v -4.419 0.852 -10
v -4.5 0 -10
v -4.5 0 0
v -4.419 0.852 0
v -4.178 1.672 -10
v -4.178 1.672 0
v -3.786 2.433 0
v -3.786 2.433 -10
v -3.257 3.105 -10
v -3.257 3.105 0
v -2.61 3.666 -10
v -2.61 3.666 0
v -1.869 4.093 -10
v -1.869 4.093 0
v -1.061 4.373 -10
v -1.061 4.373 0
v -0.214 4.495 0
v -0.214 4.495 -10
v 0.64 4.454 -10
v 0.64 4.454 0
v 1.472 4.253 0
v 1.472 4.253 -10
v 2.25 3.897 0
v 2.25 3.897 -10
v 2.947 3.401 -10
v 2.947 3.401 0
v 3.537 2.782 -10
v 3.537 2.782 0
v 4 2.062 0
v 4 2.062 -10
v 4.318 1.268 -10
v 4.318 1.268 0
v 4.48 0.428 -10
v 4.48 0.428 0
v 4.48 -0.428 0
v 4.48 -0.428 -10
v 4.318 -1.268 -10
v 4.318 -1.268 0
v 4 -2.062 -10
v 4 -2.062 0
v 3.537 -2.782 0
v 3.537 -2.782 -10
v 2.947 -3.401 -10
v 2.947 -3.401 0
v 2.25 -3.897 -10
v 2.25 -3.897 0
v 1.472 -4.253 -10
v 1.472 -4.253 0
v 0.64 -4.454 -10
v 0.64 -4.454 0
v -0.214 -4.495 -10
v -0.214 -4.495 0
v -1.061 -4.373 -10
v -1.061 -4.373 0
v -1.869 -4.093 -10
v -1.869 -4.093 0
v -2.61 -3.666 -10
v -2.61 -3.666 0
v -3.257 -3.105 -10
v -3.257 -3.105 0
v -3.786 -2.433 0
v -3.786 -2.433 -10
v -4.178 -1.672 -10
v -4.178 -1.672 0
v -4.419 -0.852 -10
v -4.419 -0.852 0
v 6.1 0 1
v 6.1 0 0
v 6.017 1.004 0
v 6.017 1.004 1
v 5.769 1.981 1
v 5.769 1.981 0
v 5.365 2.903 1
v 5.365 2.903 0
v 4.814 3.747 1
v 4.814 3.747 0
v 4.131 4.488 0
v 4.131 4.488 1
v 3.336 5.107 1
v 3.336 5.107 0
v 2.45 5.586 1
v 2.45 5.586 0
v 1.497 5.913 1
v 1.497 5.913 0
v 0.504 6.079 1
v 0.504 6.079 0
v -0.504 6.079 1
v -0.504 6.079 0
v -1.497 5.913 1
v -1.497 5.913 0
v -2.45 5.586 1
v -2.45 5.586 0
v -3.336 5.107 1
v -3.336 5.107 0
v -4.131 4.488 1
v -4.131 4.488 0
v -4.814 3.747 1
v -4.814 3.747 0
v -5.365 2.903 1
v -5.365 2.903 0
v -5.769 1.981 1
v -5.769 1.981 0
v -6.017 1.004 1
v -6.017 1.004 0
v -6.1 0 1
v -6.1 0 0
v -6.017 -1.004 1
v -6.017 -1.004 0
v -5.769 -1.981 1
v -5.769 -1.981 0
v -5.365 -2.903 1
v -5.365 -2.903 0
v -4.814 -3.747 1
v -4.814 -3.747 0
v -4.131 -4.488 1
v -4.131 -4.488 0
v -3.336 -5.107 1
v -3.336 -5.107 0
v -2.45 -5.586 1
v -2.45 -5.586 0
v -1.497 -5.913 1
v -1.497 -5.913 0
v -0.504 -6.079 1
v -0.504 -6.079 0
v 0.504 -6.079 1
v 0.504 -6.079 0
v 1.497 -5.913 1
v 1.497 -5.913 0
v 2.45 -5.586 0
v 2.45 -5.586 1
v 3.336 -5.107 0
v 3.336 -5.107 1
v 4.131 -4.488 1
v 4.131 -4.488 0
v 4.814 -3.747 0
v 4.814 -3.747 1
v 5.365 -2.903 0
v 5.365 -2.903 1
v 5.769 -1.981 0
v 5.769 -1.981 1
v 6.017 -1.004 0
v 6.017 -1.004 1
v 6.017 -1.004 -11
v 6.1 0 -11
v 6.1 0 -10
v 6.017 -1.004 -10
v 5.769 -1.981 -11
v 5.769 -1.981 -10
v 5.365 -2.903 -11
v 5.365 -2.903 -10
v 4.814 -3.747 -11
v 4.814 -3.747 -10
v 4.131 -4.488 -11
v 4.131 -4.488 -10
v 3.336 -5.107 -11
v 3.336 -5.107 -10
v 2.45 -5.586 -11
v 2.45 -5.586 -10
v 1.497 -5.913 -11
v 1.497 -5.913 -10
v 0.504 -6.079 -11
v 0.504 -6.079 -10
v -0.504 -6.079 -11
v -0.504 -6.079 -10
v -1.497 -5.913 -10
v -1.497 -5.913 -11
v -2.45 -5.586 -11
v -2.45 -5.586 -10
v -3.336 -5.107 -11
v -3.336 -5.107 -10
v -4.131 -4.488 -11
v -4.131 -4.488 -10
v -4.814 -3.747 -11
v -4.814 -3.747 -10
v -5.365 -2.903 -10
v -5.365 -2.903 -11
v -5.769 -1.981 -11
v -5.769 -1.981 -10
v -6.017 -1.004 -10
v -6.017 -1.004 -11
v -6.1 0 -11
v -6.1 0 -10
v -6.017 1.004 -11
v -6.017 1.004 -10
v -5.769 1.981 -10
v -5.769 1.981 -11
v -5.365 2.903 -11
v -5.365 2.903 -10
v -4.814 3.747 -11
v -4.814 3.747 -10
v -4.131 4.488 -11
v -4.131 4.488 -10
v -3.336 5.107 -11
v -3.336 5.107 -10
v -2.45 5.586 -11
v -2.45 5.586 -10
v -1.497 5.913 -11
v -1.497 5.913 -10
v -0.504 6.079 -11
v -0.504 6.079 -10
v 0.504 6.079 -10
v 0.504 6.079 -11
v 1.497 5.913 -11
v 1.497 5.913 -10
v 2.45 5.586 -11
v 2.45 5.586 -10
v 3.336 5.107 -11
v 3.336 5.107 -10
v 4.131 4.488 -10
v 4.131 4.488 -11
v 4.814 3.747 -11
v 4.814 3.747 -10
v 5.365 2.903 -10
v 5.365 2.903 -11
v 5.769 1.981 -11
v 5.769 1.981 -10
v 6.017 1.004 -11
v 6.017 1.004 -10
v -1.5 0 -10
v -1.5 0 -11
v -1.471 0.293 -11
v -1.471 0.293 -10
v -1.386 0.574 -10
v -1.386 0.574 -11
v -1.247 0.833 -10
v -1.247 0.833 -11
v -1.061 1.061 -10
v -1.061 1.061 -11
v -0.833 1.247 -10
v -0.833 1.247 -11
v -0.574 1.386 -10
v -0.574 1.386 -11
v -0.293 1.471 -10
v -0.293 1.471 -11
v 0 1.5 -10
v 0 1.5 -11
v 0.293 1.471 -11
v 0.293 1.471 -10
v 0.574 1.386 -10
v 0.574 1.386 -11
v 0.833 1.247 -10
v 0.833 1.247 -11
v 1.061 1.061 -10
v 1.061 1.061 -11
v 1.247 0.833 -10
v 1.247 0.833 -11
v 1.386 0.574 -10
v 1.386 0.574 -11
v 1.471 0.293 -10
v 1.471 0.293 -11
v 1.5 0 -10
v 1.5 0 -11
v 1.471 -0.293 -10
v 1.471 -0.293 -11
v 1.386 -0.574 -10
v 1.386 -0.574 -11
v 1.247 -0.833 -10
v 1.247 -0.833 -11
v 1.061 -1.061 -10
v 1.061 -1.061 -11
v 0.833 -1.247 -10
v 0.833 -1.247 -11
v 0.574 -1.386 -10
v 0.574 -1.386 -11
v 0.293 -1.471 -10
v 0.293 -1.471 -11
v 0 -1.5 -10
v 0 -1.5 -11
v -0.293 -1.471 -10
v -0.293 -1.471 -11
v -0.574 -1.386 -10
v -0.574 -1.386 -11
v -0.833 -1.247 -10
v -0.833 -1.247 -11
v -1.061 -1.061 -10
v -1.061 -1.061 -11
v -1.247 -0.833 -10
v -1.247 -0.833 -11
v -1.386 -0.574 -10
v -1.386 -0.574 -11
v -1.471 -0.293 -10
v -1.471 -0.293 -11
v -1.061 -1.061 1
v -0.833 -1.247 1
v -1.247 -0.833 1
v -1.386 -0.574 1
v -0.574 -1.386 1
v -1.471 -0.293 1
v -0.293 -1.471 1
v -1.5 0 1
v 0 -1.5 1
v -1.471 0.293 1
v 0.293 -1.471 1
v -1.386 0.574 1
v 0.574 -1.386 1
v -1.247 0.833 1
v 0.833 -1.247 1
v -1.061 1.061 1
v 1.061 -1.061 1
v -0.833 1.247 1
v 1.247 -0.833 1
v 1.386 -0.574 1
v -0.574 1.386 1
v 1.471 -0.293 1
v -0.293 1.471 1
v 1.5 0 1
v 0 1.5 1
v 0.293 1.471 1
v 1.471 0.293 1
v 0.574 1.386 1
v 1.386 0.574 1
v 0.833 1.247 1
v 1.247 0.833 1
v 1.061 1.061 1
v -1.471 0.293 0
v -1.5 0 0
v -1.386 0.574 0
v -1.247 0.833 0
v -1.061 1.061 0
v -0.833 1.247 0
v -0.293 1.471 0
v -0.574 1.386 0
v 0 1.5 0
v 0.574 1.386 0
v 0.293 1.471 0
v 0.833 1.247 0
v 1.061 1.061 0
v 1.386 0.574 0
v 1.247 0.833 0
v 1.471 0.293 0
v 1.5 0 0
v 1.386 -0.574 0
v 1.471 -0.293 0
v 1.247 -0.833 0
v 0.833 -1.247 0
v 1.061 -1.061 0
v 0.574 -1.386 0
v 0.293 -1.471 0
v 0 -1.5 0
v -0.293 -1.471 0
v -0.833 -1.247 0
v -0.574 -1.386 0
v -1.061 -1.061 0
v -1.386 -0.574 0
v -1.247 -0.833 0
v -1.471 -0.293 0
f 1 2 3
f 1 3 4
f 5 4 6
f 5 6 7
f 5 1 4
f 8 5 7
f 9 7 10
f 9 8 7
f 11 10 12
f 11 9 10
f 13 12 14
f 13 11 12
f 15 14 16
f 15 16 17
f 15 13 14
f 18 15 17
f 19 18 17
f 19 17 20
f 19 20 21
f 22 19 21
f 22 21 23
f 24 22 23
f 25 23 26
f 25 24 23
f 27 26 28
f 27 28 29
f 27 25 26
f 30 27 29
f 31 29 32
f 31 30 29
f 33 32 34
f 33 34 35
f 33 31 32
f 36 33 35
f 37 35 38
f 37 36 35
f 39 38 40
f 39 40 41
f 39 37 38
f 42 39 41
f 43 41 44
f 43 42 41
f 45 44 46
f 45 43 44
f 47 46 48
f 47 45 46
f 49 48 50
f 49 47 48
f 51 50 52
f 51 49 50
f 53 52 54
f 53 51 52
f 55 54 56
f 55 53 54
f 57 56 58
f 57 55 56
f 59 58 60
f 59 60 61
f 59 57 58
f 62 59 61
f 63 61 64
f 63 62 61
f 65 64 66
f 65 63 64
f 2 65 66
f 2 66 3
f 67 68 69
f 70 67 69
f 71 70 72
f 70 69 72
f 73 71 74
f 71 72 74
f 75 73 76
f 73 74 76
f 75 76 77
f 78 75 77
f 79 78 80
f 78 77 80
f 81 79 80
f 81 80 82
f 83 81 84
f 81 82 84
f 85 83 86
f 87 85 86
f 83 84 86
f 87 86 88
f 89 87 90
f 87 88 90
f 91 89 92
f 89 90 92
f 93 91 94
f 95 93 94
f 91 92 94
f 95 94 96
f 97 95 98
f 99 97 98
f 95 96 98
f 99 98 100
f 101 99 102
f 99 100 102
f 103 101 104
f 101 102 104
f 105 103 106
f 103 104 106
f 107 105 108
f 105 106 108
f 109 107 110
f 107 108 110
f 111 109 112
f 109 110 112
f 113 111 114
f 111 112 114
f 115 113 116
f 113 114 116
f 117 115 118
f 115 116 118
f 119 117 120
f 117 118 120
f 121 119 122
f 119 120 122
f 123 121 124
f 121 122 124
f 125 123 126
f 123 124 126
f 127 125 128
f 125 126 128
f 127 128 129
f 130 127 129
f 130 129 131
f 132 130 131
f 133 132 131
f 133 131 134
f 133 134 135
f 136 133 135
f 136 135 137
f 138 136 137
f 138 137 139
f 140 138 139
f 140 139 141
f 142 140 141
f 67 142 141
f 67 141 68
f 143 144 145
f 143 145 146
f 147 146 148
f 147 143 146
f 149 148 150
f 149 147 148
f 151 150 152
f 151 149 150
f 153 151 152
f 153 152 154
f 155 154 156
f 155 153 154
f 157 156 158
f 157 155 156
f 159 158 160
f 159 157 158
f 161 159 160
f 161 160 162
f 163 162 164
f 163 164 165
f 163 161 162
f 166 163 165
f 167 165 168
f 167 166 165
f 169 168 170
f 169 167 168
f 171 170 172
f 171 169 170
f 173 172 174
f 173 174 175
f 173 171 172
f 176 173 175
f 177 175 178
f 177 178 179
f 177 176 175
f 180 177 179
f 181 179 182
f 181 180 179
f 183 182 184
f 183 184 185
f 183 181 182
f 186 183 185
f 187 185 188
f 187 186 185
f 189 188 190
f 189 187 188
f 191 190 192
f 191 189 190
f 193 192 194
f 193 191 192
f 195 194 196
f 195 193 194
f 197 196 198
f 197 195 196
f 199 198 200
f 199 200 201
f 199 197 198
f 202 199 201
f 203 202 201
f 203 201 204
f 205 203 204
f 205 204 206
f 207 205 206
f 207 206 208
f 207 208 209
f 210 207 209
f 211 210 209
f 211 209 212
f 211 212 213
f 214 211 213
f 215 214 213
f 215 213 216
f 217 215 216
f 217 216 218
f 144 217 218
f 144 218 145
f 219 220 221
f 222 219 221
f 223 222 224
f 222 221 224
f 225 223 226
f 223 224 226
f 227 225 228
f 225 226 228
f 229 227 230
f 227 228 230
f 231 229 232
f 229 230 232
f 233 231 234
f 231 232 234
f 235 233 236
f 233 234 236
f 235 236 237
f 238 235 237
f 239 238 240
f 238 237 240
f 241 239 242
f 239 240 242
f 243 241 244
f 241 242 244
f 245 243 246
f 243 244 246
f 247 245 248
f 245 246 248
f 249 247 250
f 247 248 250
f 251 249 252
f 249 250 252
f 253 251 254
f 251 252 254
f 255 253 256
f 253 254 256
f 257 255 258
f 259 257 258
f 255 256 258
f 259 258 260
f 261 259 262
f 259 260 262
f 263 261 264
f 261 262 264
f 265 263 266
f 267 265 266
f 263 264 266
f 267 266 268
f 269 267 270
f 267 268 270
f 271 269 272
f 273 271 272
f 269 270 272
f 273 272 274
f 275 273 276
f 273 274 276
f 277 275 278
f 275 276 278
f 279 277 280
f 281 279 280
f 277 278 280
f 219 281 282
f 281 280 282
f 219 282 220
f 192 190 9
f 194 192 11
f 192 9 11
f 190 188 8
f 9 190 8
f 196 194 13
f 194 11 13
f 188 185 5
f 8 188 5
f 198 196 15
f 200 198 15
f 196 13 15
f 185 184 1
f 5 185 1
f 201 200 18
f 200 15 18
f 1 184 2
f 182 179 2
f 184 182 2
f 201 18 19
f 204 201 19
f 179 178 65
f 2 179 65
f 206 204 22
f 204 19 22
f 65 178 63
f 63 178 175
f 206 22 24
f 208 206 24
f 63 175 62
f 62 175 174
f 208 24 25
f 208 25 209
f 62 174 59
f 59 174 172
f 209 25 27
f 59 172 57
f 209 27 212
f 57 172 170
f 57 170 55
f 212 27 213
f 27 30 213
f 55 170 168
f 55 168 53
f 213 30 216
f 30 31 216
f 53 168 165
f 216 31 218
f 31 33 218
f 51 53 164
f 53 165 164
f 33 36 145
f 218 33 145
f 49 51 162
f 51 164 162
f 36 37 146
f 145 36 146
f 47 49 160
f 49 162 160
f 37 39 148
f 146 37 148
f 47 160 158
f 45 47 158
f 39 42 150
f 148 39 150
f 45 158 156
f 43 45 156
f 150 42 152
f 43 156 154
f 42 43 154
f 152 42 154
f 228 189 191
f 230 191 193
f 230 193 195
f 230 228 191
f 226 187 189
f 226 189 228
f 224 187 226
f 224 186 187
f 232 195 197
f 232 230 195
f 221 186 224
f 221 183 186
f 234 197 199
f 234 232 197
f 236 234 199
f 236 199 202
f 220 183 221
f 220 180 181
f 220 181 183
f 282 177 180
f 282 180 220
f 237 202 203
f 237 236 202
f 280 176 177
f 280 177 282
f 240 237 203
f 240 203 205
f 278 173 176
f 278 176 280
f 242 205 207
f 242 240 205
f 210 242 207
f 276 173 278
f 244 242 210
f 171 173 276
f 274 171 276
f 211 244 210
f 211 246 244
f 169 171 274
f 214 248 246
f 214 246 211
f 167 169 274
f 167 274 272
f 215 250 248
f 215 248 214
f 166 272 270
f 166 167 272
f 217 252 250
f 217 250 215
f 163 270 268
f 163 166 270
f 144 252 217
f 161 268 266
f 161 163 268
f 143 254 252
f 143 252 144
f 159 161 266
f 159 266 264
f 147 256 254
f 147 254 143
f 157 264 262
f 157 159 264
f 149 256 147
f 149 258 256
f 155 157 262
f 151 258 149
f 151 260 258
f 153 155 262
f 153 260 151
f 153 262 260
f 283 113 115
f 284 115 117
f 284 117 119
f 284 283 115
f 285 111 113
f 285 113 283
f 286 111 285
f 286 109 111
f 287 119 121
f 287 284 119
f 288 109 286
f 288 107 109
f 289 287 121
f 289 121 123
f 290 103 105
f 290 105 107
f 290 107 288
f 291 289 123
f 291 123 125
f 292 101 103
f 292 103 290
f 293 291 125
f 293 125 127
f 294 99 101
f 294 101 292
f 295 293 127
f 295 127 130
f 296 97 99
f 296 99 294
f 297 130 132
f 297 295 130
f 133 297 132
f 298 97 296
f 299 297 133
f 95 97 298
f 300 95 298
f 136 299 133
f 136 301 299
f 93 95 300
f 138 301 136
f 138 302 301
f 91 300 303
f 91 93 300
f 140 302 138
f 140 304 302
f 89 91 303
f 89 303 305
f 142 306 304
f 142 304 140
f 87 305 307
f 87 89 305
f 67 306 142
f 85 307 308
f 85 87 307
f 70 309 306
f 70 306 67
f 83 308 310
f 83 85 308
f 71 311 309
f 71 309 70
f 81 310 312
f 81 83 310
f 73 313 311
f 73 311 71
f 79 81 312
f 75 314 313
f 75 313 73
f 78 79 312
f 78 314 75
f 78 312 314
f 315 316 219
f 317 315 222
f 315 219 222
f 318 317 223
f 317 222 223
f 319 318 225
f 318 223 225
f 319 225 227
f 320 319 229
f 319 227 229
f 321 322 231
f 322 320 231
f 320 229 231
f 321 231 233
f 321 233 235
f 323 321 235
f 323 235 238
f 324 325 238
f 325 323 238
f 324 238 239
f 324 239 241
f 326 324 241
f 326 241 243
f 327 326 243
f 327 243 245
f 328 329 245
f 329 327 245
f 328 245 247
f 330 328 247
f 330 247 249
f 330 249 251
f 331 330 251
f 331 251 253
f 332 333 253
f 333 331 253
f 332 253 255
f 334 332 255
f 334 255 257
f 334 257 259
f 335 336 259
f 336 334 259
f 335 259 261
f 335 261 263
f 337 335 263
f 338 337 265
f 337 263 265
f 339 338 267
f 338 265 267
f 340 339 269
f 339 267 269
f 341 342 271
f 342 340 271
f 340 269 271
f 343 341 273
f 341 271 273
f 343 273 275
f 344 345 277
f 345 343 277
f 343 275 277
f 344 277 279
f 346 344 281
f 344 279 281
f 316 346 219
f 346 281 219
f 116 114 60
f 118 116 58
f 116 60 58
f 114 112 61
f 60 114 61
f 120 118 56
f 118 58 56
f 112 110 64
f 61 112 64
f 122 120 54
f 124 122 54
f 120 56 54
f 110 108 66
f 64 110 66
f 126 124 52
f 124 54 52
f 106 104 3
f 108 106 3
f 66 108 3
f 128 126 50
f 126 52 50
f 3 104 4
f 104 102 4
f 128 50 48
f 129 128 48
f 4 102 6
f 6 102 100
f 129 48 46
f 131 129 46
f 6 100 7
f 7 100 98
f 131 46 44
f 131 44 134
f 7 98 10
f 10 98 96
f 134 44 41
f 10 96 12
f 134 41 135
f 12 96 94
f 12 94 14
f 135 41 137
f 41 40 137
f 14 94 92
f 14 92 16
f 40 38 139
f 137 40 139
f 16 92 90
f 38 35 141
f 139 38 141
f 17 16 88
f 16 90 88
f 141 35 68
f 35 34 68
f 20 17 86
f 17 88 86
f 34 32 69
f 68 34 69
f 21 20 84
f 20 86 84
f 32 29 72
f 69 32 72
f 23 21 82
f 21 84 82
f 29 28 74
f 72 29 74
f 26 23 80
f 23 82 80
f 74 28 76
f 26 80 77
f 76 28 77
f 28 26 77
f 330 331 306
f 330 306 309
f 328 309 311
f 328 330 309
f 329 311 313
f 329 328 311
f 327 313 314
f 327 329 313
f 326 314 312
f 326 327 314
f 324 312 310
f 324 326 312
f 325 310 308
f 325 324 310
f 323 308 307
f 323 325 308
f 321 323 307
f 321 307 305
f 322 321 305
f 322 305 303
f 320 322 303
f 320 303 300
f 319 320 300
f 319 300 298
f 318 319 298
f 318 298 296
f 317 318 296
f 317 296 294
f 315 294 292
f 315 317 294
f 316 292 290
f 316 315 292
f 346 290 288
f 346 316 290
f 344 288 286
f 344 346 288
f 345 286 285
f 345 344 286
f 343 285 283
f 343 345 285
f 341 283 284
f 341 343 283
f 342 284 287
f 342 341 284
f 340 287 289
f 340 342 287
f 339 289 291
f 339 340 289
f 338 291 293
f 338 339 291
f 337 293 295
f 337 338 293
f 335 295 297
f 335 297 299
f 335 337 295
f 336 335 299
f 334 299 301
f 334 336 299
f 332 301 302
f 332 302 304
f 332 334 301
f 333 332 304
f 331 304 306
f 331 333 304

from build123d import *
from build123d.topology import SkipClean

# Parameters (mm, degrees)
ESQUISSE1_R        = 6.1
ESQUISSE1_R_2      = 1.5
BOSS_EXTRU_1_DEPTH = 1
BOSS_EXTRU_2_START = 10
ESQUISSE2_R        = 4.5
ESQUISSE2_R_2      = 1.5
BOSS_EXTRU_2_DEPTH = 10
BOSS_EXTRU_3_START = 1
ESQUISSE3_R        = 6.1
ESQUISSE3_R_2      = 1.5
BOSS_EXTRU_3_DEPTH = 1


with BuildPart() as part:
    # Esquisse1 → Boss.-Extru.1 (new body)
    with BuildSketch(Plane.XY):
        Circle(ESQUISSE1_R)
        Circle(ESQUISSE1_R_2, mode=Mode.SUBTRACT)
    extrude(amount=BOSS_EXTRU_1_DEPTH)

    # Esquisse2 → Boss.-Extru.2 (add)
    with SkipClean():  # the faces are left unmerged after this step: merging them gives an invalid solid
        with BuildSketch(Plane(origin=(0, 0, 0), x_dir=(-1, 0, 0), z_dir=(0, 0, -1)).offset(BOSS_EXTRU_2_START)):
            Circle(ESQUISSE2_R)
            Circle(ESQUISSE2_R_2, mode=Mode.SUBTRACT)
        extrude(amount=-BOSS_EXTRU_2_DEPTH)

    # Esquisse3 → Boss.-Extru.3 (add)
    with SkipClean():  # the faces are left unmerged after this step: merging them gives an invalid solid
        with BuildSketch(Plane(origin=(0, 0, -10), x_dir=(-1, 0, 0), z_dir=(0, 0, -1)).offset(BOSS_EXTRU_3_START)):
            with Locations(Location((0, 0, 0), (0, 0, 180))):
                Circle(ESQUISSE3_R)
            Circle(ESQUISSE3_R_2, mode=Mode.SUBTRACT)
        extrude(amount=-BOSS_EXTRU_3_DEPTH)


solid = part.part
